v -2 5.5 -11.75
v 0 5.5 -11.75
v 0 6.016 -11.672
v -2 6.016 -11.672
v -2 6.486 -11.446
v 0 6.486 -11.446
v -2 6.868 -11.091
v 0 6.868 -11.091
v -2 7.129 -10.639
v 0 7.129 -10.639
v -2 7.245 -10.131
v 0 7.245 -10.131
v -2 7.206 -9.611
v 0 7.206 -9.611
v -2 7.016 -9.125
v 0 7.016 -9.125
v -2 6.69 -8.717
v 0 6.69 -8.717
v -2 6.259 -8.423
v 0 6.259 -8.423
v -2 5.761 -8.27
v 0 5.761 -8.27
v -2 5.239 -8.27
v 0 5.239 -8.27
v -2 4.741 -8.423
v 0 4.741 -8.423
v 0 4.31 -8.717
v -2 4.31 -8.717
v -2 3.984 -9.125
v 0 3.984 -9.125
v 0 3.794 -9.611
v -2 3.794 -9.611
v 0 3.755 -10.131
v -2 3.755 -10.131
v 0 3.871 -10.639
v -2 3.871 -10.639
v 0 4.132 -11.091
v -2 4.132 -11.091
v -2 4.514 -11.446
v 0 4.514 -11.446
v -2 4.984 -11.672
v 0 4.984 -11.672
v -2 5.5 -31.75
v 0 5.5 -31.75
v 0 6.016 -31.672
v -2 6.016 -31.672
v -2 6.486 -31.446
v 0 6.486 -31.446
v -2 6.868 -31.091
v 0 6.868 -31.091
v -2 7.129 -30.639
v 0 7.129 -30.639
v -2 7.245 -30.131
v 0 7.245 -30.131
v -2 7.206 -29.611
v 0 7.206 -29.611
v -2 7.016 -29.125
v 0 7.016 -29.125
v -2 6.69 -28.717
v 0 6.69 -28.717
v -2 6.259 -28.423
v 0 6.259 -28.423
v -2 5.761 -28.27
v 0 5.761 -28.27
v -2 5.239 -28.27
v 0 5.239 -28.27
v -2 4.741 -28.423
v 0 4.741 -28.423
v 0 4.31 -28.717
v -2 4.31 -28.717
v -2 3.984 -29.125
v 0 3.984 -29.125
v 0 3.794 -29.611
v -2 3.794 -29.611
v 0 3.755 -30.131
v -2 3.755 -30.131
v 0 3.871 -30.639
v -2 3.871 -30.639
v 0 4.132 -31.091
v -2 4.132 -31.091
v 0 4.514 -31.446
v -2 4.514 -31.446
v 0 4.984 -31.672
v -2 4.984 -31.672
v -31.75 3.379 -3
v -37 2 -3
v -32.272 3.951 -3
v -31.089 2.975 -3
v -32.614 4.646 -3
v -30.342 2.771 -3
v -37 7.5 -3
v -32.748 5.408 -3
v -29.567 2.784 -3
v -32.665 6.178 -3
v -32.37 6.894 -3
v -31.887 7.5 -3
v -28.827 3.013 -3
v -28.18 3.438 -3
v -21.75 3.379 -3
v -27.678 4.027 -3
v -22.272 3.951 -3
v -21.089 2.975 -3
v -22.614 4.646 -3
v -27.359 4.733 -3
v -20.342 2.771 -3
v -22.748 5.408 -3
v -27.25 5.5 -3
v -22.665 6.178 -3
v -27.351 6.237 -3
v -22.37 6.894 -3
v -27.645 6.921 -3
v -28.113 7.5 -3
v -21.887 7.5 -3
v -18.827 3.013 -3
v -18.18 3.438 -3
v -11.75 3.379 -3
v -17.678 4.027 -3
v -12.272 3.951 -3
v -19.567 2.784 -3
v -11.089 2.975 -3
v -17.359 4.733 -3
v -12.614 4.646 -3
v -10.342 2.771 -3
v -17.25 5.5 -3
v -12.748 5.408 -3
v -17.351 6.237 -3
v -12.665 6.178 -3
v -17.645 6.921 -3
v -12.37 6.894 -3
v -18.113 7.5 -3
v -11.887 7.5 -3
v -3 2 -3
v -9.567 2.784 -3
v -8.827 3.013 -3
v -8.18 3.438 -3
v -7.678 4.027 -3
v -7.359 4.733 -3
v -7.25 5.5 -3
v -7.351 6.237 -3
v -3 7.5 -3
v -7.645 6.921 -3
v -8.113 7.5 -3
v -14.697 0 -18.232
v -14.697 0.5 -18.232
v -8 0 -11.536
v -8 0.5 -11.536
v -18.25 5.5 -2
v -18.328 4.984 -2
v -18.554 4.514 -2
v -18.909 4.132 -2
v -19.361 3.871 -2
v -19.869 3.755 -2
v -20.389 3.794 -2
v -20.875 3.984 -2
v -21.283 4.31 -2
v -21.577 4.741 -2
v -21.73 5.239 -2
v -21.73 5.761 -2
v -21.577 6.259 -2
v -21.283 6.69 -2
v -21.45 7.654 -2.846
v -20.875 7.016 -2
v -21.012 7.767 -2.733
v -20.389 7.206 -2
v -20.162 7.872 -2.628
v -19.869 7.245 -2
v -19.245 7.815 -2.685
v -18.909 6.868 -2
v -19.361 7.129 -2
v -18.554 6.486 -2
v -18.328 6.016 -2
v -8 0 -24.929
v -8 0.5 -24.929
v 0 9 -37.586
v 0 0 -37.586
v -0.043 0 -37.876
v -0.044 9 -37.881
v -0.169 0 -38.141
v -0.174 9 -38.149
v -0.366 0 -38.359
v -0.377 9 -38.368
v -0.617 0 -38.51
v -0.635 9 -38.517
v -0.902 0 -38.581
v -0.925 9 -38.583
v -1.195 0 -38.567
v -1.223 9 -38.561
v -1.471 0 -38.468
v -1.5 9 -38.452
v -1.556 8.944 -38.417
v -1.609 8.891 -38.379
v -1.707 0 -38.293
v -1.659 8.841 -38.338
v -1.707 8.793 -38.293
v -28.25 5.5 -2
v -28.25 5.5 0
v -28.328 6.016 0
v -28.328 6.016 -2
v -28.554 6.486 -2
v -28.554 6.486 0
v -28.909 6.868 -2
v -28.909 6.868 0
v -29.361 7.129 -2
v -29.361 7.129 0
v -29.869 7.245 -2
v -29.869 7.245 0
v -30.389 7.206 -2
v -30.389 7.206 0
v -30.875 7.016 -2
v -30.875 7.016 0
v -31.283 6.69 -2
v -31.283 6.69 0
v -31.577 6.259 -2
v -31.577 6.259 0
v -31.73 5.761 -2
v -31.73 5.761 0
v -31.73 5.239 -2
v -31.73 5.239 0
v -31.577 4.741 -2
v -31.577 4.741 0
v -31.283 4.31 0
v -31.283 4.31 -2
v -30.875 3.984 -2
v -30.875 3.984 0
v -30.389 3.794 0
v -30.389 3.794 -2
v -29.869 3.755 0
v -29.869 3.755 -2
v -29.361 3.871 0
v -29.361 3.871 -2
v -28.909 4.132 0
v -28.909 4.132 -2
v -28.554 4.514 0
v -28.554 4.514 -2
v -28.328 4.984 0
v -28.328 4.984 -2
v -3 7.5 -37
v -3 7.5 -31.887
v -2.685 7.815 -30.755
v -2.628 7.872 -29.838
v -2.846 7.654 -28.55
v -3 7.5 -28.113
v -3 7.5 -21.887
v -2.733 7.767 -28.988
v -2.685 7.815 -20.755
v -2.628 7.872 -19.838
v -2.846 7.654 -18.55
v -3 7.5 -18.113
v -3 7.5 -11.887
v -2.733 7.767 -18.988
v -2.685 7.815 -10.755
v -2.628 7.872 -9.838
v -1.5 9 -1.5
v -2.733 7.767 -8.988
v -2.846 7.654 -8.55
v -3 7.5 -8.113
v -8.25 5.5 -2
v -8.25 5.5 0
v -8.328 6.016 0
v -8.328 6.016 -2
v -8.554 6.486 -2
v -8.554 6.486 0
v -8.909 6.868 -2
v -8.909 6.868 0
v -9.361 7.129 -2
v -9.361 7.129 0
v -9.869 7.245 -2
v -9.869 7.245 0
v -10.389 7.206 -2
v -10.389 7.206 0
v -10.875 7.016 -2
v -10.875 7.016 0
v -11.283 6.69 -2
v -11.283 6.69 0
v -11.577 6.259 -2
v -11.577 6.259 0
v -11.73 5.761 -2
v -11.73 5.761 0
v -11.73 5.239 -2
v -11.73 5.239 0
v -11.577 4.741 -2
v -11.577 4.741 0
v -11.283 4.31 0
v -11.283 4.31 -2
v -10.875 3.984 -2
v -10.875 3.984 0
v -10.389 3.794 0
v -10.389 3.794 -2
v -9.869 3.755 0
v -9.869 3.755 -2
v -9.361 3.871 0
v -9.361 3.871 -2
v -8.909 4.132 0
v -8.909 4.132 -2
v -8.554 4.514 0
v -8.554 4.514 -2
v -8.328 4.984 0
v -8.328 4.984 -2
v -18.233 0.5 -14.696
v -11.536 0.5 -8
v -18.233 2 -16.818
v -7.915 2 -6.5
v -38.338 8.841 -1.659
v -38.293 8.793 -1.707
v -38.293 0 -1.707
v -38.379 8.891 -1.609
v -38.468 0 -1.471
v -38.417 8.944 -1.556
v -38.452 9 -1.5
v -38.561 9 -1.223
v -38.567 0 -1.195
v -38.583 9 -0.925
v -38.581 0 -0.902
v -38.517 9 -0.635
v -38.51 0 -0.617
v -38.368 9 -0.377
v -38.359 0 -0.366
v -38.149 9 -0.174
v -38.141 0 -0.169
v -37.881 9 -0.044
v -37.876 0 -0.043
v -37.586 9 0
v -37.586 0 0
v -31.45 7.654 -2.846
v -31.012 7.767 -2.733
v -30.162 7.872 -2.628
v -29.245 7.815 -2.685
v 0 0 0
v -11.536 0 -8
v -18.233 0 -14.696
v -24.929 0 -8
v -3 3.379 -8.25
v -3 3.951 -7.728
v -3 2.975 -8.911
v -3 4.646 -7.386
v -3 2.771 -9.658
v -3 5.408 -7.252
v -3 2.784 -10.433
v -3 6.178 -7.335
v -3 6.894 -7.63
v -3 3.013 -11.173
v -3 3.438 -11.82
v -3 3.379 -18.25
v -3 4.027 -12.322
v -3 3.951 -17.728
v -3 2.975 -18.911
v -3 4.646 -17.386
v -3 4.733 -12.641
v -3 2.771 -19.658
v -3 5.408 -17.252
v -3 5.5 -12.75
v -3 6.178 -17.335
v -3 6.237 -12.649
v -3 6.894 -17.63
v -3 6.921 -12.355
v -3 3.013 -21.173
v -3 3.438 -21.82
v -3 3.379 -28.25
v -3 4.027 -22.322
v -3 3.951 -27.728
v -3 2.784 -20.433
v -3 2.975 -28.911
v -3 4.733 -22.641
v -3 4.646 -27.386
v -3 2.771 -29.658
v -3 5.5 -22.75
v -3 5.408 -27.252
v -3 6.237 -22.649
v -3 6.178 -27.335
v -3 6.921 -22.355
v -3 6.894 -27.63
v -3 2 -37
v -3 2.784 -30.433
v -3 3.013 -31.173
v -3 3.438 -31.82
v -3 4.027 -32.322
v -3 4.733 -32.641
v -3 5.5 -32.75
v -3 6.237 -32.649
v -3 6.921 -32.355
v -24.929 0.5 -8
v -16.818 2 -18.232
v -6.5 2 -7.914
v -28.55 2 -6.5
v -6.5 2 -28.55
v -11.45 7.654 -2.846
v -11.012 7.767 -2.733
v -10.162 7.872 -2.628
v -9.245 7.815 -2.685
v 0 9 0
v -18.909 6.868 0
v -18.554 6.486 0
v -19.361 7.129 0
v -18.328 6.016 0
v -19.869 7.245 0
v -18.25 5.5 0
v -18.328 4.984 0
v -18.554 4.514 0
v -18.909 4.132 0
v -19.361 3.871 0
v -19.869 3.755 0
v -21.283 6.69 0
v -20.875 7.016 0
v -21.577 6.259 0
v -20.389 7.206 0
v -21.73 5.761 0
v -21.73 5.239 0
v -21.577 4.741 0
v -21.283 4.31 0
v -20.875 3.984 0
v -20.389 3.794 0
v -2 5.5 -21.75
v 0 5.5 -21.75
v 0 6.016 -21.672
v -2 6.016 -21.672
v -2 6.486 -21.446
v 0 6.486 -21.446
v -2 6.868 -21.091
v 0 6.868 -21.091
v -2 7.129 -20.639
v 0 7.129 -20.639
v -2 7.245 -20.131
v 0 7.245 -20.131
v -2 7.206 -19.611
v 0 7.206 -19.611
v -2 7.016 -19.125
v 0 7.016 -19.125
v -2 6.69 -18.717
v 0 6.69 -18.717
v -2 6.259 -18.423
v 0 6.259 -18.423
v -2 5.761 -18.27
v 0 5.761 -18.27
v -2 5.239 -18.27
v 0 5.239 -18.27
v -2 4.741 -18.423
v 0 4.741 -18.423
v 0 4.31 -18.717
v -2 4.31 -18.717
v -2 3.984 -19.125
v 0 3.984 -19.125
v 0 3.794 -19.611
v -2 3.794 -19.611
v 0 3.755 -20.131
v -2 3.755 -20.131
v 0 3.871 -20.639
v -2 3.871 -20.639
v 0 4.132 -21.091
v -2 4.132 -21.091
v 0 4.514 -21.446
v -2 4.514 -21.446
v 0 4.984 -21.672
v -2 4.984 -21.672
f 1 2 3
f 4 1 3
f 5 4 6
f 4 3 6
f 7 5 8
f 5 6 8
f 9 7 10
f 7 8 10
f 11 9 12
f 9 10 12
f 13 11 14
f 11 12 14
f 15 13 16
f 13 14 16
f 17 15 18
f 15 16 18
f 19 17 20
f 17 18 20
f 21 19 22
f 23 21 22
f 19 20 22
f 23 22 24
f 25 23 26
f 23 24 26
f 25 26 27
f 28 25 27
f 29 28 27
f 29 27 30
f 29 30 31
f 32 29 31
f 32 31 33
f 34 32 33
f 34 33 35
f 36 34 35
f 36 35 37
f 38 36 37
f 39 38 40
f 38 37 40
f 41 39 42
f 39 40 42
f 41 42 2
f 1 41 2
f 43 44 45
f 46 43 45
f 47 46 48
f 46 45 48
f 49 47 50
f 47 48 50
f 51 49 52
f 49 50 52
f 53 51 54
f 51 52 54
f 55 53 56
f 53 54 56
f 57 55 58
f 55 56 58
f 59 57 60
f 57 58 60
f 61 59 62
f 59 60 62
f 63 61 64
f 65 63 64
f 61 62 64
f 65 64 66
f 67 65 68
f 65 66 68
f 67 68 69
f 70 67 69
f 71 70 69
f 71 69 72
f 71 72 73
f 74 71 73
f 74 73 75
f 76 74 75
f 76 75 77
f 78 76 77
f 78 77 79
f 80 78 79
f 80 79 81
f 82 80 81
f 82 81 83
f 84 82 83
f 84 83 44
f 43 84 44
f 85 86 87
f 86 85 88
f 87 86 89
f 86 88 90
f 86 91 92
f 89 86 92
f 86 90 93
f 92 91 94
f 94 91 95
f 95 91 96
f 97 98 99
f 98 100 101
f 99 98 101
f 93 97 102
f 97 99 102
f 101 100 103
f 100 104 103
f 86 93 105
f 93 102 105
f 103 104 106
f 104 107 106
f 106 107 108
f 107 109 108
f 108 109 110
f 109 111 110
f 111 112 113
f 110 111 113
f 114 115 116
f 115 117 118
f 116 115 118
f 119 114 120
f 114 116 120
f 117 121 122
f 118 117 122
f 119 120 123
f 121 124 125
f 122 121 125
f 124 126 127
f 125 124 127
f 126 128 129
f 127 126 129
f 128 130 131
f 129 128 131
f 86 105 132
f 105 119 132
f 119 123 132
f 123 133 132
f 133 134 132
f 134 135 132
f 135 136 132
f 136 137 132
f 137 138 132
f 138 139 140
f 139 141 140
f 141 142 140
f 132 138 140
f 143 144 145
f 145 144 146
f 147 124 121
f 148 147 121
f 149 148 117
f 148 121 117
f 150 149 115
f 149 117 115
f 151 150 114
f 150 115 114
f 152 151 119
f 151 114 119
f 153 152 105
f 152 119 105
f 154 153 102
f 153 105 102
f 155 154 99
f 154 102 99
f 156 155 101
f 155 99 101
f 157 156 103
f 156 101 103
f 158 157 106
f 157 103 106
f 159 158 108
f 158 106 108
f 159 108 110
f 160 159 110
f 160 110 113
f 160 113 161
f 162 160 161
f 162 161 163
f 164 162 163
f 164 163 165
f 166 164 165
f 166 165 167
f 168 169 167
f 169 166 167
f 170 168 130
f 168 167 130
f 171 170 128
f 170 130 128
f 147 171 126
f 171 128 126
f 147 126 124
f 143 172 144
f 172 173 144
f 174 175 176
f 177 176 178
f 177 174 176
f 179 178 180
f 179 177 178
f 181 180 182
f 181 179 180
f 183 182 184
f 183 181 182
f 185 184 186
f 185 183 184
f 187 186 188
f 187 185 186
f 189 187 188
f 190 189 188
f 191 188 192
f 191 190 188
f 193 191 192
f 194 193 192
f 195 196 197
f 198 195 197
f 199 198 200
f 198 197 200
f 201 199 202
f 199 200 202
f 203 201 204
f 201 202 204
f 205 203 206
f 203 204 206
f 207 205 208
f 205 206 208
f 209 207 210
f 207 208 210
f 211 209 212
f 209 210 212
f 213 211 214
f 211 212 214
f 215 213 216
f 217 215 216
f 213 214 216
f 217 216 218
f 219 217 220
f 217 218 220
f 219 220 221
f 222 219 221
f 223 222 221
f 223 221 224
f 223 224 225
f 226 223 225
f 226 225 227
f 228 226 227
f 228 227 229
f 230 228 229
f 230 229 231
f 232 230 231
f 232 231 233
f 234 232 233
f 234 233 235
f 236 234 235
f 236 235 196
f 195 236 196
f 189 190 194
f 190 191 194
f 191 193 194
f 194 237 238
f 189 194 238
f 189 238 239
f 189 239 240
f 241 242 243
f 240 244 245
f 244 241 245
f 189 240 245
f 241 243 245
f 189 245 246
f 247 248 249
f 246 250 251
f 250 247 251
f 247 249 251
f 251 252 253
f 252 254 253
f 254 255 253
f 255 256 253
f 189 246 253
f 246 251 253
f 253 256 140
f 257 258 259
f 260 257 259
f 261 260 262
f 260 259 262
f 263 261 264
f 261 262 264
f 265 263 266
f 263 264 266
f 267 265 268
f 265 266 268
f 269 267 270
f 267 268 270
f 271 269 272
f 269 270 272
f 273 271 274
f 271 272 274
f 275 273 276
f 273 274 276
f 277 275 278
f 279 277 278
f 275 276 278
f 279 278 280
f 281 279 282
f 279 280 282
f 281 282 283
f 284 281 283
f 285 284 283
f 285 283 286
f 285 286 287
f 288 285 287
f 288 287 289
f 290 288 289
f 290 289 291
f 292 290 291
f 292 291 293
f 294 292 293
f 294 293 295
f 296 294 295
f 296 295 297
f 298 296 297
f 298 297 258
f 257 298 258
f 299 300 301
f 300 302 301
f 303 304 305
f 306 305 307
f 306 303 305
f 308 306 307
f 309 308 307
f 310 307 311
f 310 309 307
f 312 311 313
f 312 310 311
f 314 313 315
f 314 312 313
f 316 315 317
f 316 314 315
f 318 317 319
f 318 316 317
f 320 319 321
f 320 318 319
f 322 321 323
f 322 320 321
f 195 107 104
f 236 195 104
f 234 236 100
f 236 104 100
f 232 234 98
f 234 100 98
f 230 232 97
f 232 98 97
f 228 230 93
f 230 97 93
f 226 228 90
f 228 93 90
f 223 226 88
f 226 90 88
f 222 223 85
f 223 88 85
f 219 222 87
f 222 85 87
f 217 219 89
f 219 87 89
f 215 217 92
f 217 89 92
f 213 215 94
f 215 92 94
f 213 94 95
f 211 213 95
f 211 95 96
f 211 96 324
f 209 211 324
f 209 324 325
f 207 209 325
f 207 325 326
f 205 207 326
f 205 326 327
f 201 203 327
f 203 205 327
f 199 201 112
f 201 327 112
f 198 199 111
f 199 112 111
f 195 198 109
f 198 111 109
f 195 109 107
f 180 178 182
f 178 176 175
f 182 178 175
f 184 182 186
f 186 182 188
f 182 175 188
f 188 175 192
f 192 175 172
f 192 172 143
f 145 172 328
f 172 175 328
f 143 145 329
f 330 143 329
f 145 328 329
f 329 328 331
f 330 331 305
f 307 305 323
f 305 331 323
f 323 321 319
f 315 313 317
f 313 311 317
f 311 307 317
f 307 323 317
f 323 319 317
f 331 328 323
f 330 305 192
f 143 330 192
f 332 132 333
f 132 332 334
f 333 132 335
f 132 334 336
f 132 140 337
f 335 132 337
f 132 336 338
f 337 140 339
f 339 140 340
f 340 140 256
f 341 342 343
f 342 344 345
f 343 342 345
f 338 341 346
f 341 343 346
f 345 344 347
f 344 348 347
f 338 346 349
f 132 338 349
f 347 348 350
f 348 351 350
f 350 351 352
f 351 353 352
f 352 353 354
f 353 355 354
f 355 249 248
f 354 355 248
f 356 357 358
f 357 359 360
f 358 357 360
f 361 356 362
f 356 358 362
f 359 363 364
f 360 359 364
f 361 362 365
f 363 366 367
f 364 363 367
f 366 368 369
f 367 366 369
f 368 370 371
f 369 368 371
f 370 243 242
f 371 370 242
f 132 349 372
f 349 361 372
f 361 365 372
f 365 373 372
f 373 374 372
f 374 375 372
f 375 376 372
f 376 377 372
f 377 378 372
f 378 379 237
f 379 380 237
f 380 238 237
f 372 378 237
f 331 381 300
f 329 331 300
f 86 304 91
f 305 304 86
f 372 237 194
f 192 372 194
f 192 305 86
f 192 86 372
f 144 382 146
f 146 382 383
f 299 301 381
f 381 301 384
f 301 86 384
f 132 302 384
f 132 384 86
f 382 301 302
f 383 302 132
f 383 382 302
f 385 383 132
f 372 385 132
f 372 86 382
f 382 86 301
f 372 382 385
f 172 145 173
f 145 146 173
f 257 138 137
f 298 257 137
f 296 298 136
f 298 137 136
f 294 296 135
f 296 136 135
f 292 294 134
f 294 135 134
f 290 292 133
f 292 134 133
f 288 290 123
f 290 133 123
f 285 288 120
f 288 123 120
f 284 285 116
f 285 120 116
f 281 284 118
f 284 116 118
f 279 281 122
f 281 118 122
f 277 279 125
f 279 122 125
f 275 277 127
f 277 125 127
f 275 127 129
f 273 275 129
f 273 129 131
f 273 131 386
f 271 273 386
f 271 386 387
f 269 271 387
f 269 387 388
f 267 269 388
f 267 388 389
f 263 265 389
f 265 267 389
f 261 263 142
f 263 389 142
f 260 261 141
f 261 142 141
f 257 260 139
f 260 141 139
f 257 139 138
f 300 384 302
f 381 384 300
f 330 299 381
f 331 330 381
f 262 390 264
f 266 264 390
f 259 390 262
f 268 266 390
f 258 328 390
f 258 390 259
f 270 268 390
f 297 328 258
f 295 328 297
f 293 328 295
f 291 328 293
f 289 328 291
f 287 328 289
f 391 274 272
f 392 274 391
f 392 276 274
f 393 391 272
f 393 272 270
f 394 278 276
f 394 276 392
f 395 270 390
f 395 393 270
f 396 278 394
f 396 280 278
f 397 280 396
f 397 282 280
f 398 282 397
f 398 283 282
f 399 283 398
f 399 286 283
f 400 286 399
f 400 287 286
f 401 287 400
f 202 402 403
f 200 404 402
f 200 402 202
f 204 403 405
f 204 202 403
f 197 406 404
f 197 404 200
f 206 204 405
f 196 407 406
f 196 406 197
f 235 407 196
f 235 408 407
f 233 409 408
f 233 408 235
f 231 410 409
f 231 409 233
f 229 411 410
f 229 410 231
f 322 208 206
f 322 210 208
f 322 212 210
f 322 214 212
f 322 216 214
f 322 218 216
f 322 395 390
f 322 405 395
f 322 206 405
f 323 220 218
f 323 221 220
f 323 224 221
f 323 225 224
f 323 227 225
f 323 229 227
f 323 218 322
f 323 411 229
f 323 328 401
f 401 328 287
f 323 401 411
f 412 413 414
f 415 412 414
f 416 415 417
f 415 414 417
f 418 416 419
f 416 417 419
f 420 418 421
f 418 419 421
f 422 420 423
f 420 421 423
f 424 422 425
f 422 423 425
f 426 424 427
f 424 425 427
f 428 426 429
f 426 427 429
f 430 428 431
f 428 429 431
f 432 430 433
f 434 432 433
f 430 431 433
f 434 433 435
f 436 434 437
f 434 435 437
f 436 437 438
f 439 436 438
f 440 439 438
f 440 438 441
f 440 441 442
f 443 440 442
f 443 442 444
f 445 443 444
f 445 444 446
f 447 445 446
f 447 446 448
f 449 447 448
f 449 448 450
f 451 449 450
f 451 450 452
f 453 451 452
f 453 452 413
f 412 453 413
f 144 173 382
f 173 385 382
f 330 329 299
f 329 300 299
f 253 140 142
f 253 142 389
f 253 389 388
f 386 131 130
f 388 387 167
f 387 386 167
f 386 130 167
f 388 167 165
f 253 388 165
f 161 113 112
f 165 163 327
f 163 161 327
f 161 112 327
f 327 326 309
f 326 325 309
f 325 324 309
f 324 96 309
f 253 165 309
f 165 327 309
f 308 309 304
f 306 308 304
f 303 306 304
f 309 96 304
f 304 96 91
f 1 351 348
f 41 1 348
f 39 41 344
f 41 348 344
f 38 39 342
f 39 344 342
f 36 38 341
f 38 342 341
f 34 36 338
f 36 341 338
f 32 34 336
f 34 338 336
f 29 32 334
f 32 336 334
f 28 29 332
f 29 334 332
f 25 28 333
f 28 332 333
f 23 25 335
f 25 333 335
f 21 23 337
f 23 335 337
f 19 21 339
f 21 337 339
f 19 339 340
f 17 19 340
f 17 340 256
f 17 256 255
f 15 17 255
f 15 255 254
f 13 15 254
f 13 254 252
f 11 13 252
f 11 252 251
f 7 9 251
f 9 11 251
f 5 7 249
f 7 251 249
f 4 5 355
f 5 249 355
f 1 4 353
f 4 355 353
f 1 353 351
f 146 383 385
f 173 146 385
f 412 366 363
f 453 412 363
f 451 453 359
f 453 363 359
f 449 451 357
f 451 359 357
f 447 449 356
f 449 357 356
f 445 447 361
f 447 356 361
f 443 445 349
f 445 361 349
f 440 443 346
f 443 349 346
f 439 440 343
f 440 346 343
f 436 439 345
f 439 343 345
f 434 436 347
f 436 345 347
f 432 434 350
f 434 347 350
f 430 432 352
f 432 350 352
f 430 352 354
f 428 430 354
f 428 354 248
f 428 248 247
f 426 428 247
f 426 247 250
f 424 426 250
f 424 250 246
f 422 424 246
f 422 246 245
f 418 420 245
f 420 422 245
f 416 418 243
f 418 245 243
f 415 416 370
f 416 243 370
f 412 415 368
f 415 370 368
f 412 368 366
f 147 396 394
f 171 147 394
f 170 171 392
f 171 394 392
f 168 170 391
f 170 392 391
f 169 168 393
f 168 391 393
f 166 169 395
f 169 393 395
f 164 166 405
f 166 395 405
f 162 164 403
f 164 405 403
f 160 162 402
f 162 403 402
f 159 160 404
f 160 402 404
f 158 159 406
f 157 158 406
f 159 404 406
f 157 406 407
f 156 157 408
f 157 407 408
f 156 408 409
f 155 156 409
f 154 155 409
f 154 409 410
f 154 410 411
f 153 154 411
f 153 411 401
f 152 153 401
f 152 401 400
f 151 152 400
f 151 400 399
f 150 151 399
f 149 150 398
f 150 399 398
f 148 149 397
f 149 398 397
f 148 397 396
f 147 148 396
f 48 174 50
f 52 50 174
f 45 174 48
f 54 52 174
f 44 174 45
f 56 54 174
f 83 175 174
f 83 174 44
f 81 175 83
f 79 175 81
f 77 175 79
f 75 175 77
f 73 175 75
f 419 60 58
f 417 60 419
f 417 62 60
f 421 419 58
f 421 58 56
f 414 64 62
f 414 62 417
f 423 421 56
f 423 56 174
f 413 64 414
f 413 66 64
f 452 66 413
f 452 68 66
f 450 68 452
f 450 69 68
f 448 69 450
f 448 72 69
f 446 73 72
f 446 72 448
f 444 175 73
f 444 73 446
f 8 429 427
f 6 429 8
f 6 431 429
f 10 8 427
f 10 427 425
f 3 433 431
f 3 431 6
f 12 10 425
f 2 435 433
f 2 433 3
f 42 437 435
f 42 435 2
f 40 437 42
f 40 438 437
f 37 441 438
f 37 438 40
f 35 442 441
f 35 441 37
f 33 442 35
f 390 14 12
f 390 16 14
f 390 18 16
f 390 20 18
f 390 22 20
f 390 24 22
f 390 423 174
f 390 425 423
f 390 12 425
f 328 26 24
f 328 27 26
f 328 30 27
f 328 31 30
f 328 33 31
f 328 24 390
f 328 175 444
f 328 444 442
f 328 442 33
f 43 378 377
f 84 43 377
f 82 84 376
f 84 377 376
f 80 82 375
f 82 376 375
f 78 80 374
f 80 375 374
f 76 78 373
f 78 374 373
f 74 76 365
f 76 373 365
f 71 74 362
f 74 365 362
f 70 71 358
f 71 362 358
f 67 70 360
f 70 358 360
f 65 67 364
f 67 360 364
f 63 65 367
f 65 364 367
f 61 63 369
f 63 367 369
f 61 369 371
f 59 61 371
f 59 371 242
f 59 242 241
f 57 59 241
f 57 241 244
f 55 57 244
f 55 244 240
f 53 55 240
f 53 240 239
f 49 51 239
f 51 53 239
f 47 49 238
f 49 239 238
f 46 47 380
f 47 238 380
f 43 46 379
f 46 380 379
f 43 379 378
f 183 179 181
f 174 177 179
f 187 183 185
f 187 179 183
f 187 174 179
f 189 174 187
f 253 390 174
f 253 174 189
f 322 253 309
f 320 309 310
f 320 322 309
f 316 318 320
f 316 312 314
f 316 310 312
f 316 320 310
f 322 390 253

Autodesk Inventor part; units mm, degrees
ref_plane "YZ Plane" through (0, 0, 0) normal (1, 0, 0) x (0, 1, 0)
ref_plane "XZ Plane" through (0, 0, 0) normal (0, 1, 0) x (-1, 0, 0)
ref_plane "XY Plane" through (0, 0, 0) normal (0, 0, 1) x (1, 0, 0)
sketch "Sketch1" plane through (0, 0, 0) normal (0, 1, 0) x (-1, 0, 0)
  line L0 (0, 0) -> (40, 0)
  line L1 (40, 0) -> (0, -40)
  line L2 (0, -40) -> (0, 0)
  dimension "d0" = 40
  dimension "d1" = 40
extrude "Extrusion1" add sketch "Sketch1" along normal blind 9
sketch "Sketch2" plane through (0, 9, 0) normal (0, 1, 0) x (1, 0, 0)
  line L0 (-37, 3) -> (-3, 3)
  line L1 (-3, 3) -> (-3, 37)
  line L2 (-3, 37) -> (-37, 3)
  line L3 (0, 0) -> (0, 40) projected
  line L4 (-40, 0) -> (0, 0) projected
  line L5 (0, 40) -> (-40, 0) projected
  dimension "d4" = 3
  dimension "d5" = 3
extrude "Extrusion2" cut sketch "Sketch2" against normal blind 7 contours L2 L1 L0
sketch "Sketch3" plane through (0, 2, 0) normal (0, 1, 0) x (1, 0, 0)
  line L0 (-24.9289, 8) -> (-11.5363, 8)
  line L1 (-11.5363, 8) -> (-18.2326, 14.6963)
  line L2 (-18.2326, 14.6963) -> (-24.9289, 8)
  line L3 (-37, 3) -> (-3, 37) projected
  line L4 (-3, 3) -> (-37, 3) projected
  line L5 (-8, 11.5357) -> (-8, 24.9289)
  line L6 (-8, 24.9289) -> (-14.6966, 18.2323)
  line L7 (-14.6966, 18.2323) -> (-8, 11.5357)
  line L8 (-3, 37) -> (-3, 3) projected
  line L9 (-40, 0) -> (0, 0) projected
  line L10 (0, 0) -> (0, 40) projected
  dimension "d8" = 5
  dimension "d9" = 5
  dimension "d10" = 5
  dimension "d11" = 5
  dimension "d12" = 45
  dimension "d13" = 45
  dimension "d14" = 21.5415
  dimension "d16" = 9.47
extrude "Extrusion3" cut sketch "Sketch3" against normal through all contours L2 L1 L0 | L7 L6 L5
sketch "Sketch4" plane through (0, 0, 0) normal (1, 0, 0) x (0, 0, -1)
  circle A0 centre (10, 5.5) radius 1.75
  circle A1 centre (20, 5.5) radius 1.75
  line L0 (0, 0) -> (40, 0) projected
  circle A2 centre (30, 5.5) radius 1.75
  line L1 (0, 0) -> (0, 9) projected
  line L2 (40, 0) -> (40, 9) projected
  dimension "d19" = 3.5
  dimension "d20" = 3.5
  dimension "d21" = 5.5
  dimension "d22" = 5.5
  dimension "d23" = 3.5
  dimension "d24" = 5.5
  dimension "d25" = 20
  dimension "d26" = 10
  dimension "d27" = 10
sketch "Sketch5" plane through (-40, 0, 0) normal (0, 0, 1) x (1, 0, 0)
  circle A0 centre (10, 5.5) radius 1.75
  circle A1 centre (20, 5.5) radius 1.75
  circle A2 centre (30, 5.5) radius 1.75
  line L0 (0, 0) -> (40, 0) projected
  line L1 (40, 0) -> (40, 9) projected
  line L2 (0, 0) -> (0, 9) projected
  dimension "d30" = 3.5
  dimension "d31" = 3.5
  dimension "d32" = 3.5
  dimension "d33" = 5.5
  dimension "d34" = 5.5
  dimension "d35" = 10
  dimension "d36" = 5.5
  dimension "d37" = 20
  dimension "d38" = 10
extrude "Extrusion6" cut sketch "Sketch4" against normal through all
extrude "Extrusion7" cut sketch "Sketch5" against normal through all
fillet "Fillet1" radius 1 2 edges at (0, 4.5, -40) (-40, 4.5, 0)
chamfer "Chamfer1" distance 1.5 angle 45 8 edges at (-21.5808, 2, -11.3482) (-18.2326, 2, -8) (-14.8845, 2, -11.3482) (-11.3483, 2, -14.884) (-11.3483, 2, -21.5806) (-8, 2, -18.2323) (-20, 9, -3) (-3, 9, -20)
chamfer "Chamfer2" distance 1 angle 45 6 edges at (-31.75, 5.5, -3) (-21.75, 5.5, -3) (-11.75, 5.5, -3) (-3, 5.5, -8.25) (-3, 5.5, -18.25) (-3, 5.5, -28.25)
properties part number "equerre_droite"
